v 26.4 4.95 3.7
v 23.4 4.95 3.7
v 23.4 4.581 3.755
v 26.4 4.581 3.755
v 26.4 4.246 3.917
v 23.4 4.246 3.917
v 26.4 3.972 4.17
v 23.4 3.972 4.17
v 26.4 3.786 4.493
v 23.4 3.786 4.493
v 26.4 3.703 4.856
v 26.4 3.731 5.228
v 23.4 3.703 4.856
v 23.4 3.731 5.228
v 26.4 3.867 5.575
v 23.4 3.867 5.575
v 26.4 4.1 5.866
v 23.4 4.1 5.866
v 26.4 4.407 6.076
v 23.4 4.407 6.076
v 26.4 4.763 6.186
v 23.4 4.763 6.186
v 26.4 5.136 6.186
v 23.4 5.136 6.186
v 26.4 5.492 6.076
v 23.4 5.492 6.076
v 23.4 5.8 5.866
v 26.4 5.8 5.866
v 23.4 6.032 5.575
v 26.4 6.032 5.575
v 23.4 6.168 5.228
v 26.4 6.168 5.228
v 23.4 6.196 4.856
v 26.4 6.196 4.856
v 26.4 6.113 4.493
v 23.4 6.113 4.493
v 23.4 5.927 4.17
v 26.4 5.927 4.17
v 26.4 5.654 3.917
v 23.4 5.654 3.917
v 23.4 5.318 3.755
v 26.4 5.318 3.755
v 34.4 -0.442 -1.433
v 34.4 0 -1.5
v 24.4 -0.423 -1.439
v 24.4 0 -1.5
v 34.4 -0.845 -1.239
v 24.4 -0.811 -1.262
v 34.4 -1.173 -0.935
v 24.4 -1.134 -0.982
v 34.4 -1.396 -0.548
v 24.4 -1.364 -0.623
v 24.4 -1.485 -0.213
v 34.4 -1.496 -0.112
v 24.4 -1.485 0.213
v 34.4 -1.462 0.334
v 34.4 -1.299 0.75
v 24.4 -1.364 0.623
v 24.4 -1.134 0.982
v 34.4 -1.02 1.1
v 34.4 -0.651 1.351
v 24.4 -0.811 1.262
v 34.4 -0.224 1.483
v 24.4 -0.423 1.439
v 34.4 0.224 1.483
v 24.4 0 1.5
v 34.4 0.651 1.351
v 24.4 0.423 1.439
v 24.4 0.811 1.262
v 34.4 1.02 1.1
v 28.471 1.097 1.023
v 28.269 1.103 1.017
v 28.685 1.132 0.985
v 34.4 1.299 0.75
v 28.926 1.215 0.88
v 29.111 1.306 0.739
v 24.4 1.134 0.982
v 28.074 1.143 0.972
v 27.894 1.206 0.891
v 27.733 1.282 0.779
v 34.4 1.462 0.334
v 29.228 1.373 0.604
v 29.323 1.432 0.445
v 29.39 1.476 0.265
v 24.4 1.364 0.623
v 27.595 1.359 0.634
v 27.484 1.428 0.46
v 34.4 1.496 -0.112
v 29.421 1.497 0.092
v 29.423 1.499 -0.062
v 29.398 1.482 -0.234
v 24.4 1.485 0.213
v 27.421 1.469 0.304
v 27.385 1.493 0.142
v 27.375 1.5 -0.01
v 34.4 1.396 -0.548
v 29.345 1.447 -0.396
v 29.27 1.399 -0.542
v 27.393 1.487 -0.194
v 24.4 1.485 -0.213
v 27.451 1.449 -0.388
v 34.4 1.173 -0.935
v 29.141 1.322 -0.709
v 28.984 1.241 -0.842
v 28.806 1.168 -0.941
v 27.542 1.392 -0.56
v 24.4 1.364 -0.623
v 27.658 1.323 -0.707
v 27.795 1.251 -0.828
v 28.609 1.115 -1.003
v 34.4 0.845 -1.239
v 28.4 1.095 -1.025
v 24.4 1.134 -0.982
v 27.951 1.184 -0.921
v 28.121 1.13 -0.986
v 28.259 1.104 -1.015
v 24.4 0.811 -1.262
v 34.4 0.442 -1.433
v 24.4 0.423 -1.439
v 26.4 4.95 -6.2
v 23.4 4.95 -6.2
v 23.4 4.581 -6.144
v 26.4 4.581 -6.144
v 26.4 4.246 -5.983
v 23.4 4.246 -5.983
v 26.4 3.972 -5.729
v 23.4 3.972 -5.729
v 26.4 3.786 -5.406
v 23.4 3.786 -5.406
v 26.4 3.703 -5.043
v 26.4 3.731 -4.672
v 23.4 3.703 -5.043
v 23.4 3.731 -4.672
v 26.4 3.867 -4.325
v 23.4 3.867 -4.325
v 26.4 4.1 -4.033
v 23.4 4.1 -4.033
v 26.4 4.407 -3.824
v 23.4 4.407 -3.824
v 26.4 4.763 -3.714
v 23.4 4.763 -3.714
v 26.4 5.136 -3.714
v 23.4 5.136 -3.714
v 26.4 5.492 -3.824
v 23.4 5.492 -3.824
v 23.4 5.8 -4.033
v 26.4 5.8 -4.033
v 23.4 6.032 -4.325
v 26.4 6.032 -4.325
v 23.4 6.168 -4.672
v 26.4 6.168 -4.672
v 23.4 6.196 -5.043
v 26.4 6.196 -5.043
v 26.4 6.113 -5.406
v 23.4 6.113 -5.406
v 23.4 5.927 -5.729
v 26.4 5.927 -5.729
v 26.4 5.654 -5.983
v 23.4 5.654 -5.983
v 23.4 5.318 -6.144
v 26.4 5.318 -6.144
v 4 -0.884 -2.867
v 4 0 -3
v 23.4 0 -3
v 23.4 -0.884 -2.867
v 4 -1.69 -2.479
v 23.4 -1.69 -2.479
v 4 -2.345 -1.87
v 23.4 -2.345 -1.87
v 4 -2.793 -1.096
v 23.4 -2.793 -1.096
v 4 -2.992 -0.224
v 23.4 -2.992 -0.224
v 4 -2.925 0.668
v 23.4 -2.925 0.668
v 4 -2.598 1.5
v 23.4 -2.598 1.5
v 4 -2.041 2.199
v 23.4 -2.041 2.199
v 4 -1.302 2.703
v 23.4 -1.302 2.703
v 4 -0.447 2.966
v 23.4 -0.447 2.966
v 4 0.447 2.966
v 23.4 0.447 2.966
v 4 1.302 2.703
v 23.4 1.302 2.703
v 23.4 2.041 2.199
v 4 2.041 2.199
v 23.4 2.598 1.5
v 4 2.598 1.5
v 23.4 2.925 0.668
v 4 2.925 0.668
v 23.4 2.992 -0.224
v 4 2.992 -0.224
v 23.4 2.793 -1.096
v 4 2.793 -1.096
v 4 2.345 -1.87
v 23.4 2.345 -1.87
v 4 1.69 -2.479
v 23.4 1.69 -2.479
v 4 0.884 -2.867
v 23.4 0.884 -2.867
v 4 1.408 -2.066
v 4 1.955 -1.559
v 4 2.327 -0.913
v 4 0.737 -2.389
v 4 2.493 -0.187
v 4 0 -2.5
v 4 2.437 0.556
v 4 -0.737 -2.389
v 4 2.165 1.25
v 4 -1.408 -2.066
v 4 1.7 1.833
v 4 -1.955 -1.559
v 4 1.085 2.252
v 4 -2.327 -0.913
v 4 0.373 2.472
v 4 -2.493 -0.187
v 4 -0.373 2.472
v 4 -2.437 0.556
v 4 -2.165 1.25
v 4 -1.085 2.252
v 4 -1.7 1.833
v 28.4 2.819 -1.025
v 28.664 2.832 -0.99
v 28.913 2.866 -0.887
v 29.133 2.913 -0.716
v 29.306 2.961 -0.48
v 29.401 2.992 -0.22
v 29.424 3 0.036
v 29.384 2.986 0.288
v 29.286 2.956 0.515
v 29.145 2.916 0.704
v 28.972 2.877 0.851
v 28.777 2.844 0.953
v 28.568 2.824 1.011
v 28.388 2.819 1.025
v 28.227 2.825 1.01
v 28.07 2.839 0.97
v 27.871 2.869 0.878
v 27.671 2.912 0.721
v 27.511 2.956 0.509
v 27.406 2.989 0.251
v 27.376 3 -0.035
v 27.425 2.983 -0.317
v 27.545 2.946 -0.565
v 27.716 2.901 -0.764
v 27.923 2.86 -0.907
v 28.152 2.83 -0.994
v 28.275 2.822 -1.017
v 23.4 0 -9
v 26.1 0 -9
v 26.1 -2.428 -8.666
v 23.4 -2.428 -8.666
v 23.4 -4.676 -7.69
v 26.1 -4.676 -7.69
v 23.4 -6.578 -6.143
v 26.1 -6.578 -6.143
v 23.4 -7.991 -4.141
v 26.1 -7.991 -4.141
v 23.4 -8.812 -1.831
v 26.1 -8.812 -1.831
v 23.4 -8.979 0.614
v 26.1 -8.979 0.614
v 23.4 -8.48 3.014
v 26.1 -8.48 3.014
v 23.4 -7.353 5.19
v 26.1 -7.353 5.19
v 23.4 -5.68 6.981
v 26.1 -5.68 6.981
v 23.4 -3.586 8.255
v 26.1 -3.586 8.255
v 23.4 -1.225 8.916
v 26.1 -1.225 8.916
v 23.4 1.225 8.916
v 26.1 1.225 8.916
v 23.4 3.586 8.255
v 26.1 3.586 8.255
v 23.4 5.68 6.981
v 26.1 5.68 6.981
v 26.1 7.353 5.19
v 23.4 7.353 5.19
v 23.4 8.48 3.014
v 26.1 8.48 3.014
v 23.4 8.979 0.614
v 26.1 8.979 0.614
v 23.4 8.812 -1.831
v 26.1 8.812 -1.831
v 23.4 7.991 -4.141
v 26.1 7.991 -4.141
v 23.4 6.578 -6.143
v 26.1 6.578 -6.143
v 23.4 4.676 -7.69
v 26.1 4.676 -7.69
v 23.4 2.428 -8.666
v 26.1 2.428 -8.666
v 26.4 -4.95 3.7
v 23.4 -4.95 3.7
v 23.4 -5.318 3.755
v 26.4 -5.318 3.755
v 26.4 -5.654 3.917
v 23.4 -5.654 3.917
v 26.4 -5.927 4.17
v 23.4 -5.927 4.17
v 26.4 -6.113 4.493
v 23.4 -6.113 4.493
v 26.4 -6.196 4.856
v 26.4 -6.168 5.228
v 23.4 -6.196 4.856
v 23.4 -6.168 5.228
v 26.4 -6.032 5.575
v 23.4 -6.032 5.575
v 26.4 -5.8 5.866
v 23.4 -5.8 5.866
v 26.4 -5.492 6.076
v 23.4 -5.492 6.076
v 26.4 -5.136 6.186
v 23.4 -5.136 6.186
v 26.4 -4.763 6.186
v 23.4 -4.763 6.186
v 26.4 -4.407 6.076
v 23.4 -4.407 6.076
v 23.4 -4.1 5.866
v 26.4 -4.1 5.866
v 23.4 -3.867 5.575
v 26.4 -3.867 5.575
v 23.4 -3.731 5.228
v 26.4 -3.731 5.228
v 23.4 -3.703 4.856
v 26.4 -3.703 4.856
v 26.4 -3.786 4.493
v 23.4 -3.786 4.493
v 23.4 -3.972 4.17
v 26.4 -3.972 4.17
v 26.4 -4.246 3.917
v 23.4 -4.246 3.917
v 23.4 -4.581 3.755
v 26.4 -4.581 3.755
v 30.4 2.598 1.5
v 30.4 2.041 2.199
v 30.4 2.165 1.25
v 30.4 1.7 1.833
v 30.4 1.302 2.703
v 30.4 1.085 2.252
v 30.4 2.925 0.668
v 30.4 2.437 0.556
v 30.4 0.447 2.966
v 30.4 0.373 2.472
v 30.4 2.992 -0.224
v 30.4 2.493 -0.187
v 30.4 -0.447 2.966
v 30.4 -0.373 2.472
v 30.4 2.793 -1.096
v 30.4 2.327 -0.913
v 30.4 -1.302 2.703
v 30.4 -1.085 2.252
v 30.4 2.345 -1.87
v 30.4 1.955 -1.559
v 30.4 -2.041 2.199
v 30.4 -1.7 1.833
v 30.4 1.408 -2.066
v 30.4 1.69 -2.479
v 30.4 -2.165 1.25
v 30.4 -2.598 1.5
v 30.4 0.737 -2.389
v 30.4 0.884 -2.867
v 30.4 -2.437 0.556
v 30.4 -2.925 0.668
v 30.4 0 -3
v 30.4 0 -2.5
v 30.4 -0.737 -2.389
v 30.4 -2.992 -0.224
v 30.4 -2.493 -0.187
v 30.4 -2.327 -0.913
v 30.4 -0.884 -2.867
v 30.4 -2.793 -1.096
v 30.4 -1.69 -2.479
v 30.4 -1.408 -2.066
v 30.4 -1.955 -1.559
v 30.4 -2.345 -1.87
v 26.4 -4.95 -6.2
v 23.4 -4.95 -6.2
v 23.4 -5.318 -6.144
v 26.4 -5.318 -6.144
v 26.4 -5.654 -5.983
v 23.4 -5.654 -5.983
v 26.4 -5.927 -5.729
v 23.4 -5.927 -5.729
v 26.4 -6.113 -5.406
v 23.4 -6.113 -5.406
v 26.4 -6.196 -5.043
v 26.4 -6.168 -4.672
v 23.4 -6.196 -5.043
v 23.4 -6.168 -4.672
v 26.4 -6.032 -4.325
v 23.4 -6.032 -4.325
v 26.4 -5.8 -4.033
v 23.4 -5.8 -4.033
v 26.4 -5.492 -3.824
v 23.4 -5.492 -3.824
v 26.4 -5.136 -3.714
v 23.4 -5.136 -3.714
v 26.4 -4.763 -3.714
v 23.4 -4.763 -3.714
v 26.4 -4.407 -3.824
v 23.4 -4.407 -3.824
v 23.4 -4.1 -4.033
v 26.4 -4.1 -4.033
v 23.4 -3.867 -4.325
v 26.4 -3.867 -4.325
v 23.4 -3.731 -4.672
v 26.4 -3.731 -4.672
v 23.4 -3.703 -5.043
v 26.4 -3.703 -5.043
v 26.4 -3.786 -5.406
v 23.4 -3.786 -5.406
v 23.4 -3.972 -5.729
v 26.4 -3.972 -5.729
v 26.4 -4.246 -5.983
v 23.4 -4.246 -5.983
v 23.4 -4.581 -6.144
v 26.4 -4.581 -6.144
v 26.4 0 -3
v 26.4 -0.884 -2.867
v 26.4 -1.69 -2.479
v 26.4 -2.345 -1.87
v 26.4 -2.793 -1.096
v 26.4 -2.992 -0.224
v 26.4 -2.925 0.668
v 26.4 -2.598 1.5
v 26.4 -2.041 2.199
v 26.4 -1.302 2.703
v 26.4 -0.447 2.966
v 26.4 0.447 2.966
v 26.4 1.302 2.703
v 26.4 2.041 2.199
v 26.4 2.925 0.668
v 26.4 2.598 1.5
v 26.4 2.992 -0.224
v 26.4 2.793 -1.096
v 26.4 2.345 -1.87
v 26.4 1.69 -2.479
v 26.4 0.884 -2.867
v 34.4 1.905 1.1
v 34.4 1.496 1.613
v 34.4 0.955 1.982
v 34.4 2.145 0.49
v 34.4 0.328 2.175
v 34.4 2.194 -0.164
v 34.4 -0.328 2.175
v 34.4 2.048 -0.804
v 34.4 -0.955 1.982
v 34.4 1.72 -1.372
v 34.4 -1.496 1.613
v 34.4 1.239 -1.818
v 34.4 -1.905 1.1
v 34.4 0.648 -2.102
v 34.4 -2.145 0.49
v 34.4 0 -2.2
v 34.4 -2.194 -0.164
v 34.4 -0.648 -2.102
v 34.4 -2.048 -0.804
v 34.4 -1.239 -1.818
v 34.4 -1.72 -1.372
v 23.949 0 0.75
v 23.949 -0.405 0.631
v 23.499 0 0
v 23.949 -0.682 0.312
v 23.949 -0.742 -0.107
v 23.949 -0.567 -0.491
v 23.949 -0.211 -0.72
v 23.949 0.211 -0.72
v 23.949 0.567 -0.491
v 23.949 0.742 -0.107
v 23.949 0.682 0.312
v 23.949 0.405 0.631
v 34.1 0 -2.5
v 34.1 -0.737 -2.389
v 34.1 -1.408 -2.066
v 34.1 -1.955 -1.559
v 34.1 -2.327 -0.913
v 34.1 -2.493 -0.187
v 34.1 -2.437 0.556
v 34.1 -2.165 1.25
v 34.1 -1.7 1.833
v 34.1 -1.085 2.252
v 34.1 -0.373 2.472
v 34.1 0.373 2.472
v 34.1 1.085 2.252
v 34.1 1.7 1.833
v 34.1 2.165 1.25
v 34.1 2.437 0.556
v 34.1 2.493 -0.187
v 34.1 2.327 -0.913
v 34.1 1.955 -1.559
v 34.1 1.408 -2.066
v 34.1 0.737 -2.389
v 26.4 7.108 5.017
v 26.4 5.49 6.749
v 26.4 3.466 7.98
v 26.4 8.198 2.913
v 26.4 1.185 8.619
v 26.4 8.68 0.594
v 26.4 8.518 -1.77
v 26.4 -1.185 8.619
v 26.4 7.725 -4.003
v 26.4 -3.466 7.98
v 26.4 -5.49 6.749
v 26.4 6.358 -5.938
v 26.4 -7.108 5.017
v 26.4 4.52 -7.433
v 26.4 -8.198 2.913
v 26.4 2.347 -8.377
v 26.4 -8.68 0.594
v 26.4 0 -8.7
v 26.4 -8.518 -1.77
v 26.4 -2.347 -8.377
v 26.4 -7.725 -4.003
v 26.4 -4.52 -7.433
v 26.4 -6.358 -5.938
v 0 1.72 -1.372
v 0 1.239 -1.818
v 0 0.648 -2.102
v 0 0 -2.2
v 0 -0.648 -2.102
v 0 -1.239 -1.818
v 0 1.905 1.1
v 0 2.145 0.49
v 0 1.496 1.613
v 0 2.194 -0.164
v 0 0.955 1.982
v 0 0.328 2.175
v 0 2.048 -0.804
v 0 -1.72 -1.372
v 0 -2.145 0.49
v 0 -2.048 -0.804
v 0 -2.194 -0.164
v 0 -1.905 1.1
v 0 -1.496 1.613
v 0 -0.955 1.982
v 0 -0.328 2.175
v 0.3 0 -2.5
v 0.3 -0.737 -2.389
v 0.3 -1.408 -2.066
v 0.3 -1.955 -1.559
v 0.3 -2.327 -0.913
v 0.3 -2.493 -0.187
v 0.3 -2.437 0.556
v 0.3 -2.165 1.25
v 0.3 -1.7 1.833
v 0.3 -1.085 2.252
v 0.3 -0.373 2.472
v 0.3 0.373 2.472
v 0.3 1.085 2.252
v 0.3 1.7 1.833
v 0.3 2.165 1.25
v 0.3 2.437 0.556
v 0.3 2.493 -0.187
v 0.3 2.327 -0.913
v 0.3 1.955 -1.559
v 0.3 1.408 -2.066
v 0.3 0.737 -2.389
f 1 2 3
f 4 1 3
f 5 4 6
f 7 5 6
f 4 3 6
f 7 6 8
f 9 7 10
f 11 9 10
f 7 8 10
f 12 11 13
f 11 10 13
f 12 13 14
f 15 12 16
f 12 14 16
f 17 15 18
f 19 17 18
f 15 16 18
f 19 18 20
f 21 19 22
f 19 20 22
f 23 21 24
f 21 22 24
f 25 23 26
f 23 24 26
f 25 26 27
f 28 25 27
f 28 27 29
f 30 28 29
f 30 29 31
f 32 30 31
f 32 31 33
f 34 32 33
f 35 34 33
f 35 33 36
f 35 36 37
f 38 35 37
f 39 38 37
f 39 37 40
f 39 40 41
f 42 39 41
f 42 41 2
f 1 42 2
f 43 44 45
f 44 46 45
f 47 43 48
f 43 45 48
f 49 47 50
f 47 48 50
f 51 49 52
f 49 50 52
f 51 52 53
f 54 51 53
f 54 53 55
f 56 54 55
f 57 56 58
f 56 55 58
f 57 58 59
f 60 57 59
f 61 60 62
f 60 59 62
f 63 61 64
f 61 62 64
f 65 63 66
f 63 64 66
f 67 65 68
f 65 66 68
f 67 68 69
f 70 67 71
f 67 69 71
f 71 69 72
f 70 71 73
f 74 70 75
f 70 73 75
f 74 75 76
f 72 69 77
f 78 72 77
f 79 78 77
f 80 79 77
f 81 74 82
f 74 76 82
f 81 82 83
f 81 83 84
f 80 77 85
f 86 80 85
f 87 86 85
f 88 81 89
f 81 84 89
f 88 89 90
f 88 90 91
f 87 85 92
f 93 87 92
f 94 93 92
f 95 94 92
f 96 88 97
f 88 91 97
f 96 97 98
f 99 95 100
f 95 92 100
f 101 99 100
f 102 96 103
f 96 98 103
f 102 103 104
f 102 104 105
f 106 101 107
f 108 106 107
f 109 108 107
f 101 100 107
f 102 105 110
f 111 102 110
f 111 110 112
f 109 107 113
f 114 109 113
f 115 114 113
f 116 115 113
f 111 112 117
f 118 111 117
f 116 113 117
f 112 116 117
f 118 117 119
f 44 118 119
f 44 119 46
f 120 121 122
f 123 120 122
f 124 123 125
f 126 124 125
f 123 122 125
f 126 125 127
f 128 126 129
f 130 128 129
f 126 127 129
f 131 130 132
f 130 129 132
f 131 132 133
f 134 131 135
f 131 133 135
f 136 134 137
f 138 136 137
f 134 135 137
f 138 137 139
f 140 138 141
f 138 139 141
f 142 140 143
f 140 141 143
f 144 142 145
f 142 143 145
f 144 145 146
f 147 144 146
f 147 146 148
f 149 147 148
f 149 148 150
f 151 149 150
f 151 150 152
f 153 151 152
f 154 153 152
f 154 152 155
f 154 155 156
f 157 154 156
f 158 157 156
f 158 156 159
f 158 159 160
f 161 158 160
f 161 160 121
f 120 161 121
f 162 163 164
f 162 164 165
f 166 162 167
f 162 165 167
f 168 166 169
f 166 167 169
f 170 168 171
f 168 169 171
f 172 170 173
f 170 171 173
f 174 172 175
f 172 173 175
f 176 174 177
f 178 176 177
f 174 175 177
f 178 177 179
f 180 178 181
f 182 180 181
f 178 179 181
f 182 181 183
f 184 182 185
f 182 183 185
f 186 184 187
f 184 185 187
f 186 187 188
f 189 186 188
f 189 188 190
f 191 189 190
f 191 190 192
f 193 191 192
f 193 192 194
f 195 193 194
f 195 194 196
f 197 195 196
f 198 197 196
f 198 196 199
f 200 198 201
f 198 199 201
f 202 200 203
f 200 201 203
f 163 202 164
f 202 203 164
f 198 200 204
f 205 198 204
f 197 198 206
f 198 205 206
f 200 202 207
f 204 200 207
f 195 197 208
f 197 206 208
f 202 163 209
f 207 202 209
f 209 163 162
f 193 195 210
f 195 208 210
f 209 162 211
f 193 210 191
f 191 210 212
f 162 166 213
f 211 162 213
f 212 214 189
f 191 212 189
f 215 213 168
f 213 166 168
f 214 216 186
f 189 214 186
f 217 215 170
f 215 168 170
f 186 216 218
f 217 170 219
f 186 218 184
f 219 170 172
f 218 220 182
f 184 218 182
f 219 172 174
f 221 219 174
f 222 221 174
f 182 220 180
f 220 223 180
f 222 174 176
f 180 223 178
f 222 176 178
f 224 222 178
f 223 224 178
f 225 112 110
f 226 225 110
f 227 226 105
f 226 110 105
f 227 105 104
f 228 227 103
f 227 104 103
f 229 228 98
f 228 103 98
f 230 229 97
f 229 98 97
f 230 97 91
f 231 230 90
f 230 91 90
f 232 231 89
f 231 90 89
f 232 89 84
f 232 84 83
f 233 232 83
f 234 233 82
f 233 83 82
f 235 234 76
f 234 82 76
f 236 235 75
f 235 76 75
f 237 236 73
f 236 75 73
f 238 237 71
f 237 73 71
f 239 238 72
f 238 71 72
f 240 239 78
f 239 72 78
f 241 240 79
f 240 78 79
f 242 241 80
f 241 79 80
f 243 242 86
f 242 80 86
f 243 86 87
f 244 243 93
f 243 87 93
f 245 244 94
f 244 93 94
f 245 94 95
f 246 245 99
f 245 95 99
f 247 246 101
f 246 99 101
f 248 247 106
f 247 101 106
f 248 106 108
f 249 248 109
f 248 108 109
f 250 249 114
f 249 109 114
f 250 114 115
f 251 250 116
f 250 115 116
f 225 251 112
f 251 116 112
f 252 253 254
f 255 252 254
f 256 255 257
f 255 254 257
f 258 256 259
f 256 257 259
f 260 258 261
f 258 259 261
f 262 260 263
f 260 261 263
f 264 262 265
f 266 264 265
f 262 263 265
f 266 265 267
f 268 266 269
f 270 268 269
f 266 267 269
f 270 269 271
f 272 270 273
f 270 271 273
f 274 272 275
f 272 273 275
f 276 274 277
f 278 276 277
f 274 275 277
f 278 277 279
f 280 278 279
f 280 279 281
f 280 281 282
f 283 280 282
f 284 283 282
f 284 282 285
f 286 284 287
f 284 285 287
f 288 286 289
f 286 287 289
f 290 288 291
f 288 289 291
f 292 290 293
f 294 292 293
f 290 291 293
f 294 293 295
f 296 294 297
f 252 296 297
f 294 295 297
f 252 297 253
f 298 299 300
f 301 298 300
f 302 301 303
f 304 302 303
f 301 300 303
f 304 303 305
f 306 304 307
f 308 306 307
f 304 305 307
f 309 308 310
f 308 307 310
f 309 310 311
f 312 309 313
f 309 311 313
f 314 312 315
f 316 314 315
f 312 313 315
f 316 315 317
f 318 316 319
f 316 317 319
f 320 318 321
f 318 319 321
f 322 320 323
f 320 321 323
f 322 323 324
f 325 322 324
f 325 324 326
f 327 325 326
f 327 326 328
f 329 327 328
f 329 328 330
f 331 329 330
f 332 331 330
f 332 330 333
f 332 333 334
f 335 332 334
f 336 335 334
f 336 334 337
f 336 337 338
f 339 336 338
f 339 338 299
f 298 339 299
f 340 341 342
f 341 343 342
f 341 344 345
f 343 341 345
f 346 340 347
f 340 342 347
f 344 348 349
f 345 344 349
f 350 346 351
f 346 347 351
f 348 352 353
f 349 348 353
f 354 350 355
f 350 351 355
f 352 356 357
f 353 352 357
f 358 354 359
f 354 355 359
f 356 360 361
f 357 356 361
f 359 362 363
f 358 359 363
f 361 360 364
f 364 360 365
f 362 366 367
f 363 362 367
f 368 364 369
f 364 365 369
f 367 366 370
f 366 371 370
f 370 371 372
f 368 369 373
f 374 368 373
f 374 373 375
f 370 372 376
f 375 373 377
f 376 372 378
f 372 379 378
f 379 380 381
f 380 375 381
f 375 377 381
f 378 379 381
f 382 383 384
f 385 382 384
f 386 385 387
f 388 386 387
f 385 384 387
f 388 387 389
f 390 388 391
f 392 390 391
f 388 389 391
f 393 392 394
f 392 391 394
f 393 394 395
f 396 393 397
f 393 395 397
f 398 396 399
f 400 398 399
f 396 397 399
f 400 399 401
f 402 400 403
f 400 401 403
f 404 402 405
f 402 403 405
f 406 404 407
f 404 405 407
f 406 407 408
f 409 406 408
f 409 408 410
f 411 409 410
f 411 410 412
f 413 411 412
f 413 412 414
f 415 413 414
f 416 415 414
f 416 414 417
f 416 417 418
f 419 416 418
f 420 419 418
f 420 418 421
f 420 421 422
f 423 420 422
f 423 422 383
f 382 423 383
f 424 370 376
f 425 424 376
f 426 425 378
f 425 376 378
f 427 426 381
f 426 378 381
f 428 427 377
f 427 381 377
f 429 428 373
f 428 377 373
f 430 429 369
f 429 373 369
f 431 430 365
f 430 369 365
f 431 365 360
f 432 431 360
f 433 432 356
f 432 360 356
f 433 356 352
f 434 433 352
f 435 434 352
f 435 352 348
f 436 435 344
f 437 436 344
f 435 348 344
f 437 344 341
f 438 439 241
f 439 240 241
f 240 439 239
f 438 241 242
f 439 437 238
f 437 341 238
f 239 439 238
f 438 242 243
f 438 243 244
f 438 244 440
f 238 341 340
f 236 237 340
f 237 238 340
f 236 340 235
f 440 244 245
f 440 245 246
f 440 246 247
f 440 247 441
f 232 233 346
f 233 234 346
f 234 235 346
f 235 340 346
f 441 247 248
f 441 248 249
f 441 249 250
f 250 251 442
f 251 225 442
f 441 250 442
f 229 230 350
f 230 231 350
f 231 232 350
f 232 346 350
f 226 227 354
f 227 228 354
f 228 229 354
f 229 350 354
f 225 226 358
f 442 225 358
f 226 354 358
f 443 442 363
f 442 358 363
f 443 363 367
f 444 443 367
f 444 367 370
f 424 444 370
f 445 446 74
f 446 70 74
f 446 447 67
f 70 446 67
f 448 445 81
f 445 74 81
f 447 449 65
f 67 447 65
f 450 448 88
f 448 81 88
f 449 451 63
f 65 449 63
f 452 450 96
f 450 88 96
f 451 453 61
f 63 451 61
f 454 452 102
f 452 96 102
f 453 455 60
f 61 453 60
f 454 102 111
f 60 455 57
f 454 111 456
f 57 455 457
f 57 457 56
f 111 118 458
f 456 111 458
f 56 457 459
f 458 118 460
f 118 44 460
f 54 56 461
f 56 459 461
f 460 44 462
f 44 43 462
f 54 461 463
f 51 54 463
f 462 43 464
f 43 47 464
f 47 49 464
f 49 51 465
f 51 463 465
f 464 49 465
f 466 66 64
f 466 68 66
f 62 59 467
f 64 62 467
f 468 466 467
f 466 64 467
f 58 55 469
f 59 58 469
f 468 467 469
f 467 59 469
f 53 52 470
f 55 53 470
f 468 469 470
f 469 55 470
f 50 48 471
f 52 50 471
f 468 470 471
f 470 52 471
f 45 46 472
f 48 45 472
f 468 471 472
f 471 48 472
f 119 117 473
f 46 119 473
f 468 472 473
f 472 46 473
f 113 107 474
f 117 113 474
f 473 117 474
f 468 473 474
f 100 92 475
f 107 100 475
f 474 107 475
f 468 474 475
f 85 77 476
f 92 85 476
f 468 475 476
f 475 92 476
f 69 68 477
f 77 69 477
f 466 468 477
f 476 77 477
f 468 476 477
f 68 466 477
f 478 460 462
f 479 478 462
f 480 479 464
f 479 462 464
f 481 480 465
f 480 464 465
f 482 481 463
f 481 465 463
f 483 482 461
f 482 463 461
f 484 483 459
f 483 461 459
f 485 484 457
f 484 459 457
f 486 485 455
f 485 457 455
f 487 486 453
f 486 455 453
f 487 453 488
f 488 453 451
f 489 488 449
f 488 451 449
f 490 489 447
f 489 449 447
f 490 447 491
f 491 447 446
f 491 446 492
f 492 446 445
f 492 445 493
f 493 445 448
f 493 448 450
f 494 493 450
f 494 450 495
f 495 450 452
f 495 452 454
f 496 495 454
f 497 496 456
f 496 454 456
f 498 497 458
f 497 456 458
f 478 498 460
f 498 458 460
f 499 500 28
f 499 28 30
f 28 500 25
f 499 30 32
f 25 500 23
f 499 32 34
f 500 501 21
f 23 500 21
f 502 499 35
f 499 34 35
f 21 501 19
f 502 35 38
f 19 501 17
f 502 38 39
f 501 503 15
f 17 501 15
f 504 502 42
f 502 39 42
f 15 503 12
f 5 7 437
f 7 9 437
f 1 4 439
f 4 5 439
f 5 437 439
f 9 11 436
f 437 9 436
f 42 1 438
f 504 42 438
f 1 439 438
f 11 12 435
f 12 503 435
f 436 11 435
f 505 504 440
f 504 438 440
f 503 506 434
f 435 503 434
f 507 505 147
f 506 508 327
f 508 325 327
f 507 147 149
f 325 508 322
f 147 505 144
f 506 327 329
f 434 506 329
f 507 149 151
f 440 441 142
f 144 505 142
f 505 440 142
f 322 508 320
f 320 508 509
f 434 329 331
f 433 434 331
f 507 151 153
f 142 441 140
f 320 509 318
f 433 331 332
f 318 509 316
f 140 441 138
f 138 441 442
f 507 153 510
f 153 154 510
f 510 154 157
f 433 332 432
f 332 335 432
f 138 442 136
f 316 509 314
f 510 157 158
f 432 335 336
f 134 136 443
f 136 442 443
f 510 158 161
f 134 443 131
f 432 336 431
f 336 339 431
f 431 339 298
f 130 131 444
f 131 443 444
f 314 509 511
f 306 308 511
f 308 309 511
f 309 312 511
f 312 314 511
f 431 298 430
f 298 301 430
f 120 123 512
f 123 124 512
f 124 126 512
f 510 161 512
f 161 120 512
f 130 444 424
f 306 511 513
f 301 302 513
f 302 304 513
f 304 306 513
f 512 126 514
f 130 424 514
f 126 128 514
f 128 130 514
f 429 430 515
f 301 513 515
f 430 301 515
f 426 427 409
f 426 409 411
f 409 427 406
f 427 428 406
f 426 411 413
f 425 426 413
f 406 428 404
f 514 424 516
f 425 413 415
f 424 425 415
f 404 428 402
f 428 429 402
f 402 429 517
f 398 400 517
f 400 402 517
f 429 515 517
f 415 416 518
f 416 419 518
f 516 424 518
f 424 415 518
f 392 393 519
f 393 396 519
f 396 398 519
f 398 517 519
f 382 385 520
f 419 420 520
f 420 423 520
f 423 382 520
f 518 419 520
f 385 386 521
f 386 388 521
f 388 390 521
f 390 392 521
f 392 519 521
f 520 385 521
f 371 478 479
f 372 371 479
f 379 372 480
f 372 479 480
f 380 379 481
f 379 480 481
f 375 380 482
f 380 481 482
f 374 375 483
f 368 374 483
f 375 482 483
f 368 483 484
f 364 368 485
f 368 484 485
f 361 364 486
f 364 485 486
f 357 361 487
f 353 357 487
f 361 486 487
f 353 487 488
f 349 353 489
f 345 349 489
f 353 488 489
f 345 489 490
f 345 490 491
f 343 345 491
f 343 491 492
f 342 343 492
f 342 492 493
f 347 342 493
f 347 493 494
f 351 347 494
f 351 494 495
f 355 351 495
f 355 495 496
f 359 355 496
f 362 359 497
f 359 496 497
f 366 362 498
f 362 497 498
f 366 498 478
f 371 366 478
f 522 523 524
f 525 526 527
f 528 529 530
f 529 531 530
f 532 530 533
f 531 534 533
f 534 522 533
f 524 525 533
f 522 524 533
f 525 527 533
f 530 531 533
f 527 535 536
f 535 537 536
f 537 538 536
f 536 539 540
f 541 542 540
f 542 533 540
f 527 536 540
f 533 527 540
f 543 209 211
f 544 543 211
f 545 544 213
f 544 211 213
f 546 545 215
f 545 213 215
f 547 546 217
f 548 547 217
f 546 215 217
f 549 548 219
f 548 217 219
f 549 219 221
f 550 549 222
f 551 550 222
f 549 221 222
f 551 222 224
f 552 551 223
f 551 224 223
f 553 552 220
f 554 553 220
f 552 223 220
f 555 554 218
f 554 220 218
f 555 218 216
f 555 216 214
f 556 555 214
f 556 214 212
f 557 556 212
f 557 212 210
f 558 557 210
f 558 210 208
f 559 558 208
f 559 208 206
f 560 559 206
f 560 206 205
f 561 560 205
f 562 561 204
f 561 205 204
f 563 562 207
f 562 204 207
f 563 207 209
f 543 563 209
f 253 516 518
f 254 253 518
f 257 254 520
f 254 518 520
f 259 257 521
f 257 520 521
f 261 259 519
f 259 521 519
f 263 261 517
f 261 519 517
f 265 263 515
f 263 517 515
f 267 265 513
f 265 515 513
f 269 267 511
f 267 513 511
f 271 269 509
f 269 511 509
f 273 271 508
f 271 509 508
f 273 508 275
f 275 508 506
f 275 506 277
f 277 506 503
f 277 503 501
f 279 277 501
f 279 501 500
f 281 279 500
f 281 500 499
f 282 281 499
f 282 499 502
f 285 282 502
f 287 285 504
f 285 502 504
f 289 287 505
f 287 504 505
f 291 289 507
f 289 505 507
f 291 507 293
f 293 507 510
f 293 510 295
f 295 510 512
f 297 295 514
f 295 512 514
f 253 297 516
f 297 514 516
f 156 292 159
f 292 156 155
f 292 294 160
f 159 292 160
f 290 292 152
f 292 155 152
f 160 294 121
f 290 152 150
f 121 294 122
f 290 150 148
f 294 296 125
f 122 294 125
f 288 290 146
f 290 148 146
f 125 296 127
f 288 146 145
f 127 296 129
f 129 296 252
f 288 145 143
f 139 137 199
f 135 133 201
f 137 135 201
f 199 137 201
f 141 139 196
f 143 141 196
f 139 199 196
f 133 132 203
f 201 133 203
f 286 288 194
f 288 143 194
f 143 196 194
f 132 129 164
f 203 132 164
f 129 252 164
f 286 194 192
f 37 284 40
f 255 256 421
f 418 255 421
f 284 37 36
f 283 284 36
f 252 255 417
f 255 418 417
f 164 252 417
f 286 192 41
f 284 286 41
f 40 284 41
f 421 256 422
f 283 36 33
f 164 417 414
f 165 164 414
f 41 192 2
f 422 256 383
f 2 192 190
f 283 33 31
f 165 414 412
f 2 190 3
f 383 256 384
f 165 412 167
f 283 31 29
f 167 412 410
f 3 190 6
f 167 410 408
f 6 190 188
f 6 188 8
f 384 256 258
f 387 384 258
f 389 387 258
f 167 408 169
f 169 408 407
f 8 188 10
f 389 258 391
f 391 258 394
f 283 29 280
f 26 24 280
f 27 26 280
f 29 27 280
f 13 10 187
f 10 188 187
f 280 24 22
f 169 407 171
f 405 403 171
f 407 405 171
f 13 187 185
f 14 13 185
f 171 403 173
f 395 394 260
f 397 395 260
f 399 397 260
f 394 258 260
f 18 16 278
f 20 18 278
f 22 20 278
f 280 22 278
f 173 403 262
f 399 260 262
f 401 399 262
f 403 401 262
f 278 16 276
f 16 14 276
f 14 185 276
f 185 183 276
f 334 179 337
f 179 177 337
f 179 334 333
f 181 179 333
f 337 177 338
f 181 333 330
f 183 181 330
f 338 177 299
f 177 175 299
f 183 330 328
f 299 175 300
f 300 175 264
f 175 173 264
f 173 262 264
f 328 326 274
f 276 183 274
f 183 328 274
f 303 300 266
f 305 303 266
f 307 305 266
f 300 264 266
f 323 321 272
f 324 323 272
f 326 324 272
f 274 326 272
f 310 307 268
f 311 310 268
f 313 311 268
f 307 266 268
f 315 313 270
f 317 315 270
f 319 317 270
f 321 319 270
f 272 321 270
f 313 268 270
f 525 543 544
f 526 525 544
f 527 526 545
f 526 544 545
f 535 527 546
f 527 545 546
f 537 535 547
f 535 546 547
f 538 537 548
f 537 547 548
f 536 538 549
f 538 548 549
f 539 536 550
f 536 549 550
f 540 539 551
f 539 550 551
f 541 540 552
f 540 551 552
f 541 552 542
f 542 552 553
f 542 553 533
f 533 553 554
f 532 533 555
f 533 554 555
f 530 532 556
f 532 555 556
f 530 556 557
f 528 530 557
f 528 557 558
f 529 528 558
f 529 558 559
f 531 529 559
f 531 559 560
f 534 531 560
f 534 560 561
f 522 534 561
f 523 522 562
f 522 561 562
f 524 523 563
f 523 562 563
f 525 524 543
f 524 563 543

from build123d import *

# Parameters (mm, degrees)
HOLE_WIZARD_M3_1_D       = 2.5
HOLE_WIZARD_M2_5_1_D     = 2.05
HOLE_WIZARD_M2_5_1_DEPTH = 3.75
HOLE_WIZARD_M2_5_1_TIP   = 0.615882135
CHAMFER_1_SIZE           = 0.3
MM_1_D                   = 3
MM_1_DEPTH               = 10
MM_1_TIP                 = 0.901290929


with BuildPart() as part:
    # 草图1 → 旋转1 (revolve)
    with BuildSketch(Plane.XY):
        Polygon((0, 0), (0, 2.5), (4, 2.5), (4, 3), (23.4, 3), (23.4, 9), (26.4, 9), (26.4, 3), (30.4, 3), (30.4, 2.5), (34.4, 2.5), (34.4, 0), align=None)
    revolve(axis=Axis((34.4, 0, 0), (-1, 0, 0)))

    # M3 螺纹孔1 (through all)
    with Locations(Plane(origin=(26.4, 4.949747468, 4.949747468), x_dir=(0, 0, 1), z_dir=(1, 0, 0))):
        with Locations((0, 0), (-9.899494936, 0), (-9.899494936, 9.899494936), (0, 9.899494936)):
            Hole(HOLE_WIZARD_M3_1_D / 2)

    # M2.5 螺纹孔1
    with Locations(Plane(origin=(28.4, 3, 0), x_dir=(0, 0, 1), z_dir=(0, 1, 0))):
        with Locations((0, 0)):
            Hole(HOLE_WIZARD_M2_5_1_D / 2, depth=HOLE_WIZARD_M2_5_1_DEPTH)
            with Locations((0, 0, -(HOLE_WIZARD_M2_5_1_DEPTH + HOLE_WIZARD_M2_5_1_TIP / 2))):  # 118° drill point
                Cone(0, HOLE_WIZARD_M2_5_1_D / 2, HOLE_WIZARD_M2_5_1_TIP, mode=Mode.SUBTRACT)

    # 倒角1
    chamfer_1_edges = [part.edges().sort_by_distance(p)[0] for p in [
        (34.4, -2.5, 0),
        (0, -2.5, 0),
        (26.4, -9, 0),
    ]]
    chamfer(chamfer_1_edges, length=CHAMFER_1_SIZE)

    # 大小mm 暗销孔1
    with Locations(Plane(origin=(34.4, 0, 0), x_dir=(0, 0, 1), z_dir=(1, 0, 0))):
        with Locations((0, 0)):
            Hole(MM_1_D / 2, depth=MM_1_DEPTH)
            with Locations((0, 0, -(MM_1_DEPTH + MM_1_TIP / 2))):  # 118° drill point
                Cone(0, MM_1_D / 2, MM_1_TIP, mode=Mode.SUBTRACT)


solid = part.part
